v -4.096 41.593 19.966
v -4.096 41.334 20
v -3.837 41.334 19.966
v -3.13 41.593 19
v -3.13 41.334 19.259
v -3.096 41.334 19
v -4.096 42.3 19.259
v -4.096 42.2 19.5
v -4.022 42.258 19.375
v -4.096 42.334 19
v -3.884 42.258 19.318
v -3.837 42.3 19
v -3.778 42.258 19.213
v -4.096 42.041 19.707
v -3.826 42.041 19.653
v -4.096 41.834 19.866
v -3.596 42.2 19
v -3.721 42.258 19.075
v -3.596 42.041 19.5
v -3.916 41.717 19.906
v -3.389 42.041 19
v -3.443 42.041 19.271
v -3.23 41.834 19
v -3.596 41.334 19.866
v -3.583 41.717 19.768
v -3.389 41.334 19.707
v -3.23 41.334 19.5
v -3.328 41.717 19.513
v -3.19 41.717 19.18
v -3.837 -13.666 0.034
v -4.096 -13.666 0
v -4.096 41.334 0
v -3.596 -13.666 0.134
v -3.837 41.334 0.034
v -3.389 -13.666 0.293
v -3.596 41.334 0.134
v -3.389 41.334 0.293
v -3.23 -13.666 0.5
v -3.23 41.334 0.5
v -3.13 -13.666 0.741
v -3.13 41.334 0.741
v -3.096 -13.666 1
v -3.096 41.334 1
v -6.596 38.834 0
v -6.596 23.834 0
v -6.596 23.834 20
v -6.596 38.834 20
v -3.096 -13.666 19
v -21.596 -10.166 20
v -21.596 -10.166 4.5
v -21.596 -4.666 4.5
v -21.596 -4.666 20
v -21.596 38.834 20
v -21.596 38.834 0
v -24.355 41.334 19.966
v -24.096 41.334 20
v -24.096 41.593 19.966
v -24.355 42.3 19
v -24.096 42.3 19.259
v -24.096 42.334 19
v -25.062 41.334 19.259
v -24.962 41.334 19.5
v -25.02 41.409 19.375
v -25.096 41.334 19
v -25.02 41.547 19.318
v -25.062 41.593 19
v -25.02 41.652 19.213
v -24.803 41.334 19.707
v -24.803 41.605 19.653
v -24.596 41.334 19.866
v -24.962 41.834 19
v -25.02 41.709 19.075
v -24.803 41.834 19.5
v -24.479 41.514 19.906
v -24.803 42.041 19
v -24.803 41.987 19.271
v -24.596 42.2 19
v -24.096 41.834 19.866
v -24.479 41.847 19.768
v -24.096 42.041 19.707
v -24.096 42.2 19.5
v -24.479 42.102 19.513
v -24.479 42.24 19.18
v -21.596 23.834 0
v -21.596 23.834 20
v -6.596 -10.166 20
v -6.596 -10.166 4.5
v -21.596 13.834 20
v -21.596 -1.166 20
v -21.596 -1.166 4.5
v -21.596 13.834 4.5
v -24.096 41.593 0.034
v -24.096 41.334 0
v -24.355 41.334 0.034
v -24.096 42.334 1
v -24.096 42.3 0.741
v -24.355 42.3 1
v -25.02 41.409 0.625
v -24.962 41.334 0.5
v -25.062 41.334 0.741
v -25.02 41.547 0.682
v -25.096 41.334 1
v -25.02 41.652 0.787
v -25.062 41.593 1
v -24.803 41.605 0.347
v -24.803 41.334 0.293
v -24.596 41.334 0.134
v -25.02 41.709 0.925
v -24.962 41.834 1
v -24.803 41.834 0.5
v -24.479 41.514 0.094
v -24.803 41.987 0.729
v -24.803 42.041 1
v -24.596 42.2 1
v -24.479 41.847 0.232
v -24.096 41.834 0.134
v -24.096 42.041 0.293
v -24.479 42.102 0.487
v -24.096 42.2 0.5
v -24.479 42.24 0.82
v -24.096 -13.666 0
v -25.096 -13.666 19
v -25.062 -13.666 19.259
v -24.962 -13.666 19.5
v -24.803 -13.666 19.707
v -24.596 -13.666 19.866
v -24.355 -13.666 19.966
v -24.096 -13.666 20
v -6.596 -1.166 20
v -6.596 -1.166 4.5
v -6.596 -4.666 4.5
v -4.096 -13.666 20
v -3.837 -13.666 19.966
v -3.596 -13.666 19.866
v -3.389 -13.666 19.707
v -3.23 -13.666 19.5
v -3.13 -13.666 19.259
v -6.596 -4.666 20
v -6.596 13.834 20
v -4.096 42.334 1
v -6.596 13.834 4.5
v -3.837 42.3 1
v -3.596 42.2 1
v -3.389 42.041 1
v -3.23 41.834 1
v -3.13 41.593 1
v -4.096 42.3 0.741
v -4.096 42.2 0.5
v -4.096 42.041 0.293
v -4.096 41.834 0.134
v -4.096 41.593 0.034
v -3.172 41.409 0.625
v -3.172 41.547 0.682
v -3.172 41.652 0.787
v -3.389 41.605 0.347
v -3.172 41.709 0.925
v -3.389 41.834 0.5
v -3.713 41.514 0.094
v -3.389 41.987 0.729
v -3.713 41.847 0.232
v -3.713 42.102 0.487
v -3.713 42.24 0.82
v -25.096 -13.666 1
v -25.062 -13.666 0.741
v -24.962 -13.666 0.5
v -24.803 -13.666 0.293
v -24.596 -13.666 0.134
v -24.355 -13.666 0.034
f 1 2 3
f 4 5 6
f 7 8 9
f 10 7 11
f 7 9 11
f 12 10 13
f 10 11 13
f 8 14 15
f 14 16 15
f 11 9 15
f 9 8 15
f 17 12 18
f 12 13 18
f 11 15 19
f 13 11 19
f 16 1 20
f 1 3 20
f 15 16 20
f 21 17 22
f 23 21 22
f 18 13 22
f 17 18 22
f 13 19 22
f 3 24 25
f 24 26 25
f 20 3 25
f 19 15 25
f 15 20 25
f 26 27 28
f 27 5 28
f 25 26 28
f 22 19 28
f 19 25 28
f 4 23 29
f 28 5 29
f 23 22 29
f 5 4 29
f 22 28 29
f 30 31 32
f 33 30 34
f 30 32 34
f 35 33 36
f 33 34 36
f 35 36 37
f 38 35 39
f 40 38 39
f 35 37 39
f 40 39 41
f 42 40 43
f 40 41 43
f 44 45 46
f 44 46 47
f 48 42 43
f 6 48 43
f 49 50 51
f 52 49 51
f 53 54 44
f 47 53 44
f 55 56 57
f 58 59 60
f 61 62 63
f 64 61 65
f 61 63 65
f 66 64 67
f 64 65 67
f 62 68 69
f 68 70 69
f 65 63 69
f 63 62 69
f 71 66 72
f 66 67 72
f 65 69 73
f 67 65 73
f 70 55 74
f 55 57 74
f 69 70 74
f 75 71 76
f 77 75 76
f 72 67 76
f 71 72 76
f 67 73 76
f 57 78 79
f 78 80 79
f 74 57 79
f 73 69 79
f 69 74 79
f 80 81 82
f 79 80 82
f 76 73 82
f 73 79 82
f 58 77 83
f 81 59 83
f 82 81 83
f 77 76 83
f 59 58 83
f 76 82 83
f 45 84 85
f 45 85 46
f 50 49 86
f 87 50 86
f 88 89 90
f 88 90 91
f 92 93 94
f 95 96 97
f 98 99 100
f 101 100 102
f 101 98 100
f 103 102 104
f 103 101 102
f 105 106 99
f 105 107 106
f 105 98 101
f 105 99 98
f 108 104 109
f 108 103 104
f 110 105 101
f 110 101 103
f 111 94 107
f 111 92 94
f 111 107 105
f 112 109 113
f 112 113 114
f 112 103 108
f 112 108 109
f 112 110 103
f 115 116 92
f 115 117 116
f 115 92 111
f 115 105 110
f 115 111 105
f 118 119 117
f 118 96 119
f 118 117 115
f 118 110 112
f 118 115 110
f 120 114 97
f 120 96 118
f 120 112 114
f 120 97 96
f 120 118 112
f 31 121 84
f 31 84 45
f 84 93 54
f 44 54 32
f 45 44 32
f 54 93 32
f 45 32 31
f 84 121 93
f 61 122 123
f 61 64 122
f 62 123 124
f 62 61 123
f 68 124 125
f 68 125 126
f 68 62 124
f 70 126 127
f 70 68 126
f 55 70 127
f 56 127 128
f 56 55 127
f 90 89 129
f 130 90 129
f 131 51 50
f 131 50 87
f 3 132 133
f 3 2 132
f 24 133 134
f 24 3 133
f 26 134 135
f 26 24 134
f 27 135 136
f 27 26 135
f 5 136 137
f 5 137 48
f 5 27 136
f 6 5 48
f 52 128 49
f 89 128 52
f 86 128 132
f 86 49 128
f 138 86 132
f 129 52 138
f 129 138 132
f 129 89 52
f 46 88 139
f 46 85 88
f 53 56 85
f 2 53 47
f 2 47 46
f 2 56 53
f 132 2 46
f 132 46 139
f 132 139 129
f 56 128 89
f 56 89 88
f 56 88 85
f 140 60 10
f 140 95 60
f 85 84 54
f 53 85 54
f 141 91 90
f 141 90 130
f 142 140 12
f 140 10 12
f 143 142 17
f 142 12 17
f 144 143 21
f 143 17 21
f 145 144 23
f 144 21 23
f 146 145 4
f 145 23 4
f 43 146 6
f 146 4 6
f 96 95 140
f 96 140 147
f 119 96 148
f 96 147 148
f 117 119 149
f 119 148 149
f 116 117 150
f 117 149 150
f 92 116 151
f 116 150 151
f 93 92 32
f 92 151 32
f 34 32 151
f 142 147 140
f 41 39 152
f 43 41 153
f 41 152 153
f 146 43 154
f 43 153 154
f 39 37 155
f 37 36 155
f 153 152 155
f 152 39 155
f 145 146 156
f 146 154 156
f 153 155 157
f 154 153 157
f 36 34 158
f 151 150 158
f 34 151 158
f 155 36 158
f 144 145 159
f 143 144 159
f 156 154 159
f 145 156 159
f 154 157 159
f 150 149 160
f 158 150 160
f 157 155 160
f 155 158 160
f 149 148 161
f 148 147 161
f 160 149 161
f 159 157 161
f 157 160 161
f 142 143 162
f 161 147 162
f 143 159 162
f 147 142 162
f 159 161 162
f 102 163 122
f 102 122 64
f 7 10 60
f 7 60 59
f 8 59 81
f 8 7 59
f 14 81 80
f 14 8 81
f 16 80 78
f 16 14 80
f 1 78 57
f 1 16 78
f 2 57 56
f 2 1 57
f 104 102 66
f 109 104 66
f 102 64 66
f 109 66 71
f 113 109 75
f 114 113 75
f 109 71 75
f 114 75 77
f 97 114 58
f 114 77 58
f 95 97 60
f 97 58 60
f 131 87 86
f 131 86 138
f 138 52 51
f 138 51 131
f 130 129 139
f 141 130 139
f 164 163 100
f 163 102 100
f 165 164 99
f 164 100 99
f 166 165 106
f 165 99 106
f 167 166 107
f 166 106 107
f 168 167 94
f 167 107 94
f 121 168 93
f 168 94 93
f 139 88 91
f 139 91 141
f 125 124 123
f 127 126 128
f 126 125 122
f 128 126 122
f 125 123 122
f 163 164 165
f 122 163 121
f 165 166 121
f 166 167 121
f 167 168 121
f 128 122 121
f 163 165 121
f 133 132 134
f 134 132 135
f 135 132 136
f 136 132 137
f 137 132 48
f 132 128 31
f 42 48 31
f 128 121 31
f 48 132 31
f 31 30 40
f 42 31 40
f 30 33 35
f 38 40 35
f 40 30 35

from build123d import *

# Parameters (mm, degrees)
SKETCH1_W           = 22
SKETCH1_H           = 56
SKETCH1_W_2         = 15
SKETCH1_H_2         = 15
BOSS_EXTRUDE1_DEPTH = 20
SKETCH2_W           = 15
SKETCH2_H           = 15
SKETCH2_H_2         = 5.5
CUT_EXTRUDE1_DEPTH  = 15.5
FILLET1_R           = 1


with BuildPart() as part:
    # Sketch1 → Boss-Extrude1 (new body)
    with BuildSketch(Plane.XY):
        with Locations((-14.096172604, 14.333947726)):
            Rectangle(SKETCH1_W, SKETCH1_H)
        with Locations((-14.096172604, 31.333947726)):
            Rectangle(SKETCH1_W_2, SKETCH1_H_2, mode=Mode.SUBTRACT)
    extrude(amount=BOSS_EXTRUDE1_DEPTH)

    # Sketch2 → Cut-Extrude1 (cut)
    with BuildSketch(Plane.XY.offset(20)):
        with Locations((-14.096172604, 6.333947726)):
            Rectangle(SKETCH2_W, SKETCH2_H)
        with Locations((-14.096172604, -7.416052274)):
            Rectangle(SKETCH2_W, SKETCH2_H_2)
    extrude(amount=-CUT_EXTRUDE1_DEPTH, mode=Mode.SUBTRACT)

    # Fillet1
    fillet1_edges = [part.edges().sort_by_distance(p)[0] for p in [
        (-3.096172604, 14.333947726, 20),
        (-14.096172604, 42.333947726, 20),
        (-25.096172604, 14.333947726, 20),
        (-14.096172604, 42.333947726, 0),
        (-3.096172604, 14.333947726, 0),
        (-25.096172604, 14.333947726, 0),
        (-25.096172604, 42.333947726, 10),
        (-3.096172604, 42.333947726, 10),
    ]]
    fillet(fillet1_edges, radius=FILLET1_R)


solid = part.part
